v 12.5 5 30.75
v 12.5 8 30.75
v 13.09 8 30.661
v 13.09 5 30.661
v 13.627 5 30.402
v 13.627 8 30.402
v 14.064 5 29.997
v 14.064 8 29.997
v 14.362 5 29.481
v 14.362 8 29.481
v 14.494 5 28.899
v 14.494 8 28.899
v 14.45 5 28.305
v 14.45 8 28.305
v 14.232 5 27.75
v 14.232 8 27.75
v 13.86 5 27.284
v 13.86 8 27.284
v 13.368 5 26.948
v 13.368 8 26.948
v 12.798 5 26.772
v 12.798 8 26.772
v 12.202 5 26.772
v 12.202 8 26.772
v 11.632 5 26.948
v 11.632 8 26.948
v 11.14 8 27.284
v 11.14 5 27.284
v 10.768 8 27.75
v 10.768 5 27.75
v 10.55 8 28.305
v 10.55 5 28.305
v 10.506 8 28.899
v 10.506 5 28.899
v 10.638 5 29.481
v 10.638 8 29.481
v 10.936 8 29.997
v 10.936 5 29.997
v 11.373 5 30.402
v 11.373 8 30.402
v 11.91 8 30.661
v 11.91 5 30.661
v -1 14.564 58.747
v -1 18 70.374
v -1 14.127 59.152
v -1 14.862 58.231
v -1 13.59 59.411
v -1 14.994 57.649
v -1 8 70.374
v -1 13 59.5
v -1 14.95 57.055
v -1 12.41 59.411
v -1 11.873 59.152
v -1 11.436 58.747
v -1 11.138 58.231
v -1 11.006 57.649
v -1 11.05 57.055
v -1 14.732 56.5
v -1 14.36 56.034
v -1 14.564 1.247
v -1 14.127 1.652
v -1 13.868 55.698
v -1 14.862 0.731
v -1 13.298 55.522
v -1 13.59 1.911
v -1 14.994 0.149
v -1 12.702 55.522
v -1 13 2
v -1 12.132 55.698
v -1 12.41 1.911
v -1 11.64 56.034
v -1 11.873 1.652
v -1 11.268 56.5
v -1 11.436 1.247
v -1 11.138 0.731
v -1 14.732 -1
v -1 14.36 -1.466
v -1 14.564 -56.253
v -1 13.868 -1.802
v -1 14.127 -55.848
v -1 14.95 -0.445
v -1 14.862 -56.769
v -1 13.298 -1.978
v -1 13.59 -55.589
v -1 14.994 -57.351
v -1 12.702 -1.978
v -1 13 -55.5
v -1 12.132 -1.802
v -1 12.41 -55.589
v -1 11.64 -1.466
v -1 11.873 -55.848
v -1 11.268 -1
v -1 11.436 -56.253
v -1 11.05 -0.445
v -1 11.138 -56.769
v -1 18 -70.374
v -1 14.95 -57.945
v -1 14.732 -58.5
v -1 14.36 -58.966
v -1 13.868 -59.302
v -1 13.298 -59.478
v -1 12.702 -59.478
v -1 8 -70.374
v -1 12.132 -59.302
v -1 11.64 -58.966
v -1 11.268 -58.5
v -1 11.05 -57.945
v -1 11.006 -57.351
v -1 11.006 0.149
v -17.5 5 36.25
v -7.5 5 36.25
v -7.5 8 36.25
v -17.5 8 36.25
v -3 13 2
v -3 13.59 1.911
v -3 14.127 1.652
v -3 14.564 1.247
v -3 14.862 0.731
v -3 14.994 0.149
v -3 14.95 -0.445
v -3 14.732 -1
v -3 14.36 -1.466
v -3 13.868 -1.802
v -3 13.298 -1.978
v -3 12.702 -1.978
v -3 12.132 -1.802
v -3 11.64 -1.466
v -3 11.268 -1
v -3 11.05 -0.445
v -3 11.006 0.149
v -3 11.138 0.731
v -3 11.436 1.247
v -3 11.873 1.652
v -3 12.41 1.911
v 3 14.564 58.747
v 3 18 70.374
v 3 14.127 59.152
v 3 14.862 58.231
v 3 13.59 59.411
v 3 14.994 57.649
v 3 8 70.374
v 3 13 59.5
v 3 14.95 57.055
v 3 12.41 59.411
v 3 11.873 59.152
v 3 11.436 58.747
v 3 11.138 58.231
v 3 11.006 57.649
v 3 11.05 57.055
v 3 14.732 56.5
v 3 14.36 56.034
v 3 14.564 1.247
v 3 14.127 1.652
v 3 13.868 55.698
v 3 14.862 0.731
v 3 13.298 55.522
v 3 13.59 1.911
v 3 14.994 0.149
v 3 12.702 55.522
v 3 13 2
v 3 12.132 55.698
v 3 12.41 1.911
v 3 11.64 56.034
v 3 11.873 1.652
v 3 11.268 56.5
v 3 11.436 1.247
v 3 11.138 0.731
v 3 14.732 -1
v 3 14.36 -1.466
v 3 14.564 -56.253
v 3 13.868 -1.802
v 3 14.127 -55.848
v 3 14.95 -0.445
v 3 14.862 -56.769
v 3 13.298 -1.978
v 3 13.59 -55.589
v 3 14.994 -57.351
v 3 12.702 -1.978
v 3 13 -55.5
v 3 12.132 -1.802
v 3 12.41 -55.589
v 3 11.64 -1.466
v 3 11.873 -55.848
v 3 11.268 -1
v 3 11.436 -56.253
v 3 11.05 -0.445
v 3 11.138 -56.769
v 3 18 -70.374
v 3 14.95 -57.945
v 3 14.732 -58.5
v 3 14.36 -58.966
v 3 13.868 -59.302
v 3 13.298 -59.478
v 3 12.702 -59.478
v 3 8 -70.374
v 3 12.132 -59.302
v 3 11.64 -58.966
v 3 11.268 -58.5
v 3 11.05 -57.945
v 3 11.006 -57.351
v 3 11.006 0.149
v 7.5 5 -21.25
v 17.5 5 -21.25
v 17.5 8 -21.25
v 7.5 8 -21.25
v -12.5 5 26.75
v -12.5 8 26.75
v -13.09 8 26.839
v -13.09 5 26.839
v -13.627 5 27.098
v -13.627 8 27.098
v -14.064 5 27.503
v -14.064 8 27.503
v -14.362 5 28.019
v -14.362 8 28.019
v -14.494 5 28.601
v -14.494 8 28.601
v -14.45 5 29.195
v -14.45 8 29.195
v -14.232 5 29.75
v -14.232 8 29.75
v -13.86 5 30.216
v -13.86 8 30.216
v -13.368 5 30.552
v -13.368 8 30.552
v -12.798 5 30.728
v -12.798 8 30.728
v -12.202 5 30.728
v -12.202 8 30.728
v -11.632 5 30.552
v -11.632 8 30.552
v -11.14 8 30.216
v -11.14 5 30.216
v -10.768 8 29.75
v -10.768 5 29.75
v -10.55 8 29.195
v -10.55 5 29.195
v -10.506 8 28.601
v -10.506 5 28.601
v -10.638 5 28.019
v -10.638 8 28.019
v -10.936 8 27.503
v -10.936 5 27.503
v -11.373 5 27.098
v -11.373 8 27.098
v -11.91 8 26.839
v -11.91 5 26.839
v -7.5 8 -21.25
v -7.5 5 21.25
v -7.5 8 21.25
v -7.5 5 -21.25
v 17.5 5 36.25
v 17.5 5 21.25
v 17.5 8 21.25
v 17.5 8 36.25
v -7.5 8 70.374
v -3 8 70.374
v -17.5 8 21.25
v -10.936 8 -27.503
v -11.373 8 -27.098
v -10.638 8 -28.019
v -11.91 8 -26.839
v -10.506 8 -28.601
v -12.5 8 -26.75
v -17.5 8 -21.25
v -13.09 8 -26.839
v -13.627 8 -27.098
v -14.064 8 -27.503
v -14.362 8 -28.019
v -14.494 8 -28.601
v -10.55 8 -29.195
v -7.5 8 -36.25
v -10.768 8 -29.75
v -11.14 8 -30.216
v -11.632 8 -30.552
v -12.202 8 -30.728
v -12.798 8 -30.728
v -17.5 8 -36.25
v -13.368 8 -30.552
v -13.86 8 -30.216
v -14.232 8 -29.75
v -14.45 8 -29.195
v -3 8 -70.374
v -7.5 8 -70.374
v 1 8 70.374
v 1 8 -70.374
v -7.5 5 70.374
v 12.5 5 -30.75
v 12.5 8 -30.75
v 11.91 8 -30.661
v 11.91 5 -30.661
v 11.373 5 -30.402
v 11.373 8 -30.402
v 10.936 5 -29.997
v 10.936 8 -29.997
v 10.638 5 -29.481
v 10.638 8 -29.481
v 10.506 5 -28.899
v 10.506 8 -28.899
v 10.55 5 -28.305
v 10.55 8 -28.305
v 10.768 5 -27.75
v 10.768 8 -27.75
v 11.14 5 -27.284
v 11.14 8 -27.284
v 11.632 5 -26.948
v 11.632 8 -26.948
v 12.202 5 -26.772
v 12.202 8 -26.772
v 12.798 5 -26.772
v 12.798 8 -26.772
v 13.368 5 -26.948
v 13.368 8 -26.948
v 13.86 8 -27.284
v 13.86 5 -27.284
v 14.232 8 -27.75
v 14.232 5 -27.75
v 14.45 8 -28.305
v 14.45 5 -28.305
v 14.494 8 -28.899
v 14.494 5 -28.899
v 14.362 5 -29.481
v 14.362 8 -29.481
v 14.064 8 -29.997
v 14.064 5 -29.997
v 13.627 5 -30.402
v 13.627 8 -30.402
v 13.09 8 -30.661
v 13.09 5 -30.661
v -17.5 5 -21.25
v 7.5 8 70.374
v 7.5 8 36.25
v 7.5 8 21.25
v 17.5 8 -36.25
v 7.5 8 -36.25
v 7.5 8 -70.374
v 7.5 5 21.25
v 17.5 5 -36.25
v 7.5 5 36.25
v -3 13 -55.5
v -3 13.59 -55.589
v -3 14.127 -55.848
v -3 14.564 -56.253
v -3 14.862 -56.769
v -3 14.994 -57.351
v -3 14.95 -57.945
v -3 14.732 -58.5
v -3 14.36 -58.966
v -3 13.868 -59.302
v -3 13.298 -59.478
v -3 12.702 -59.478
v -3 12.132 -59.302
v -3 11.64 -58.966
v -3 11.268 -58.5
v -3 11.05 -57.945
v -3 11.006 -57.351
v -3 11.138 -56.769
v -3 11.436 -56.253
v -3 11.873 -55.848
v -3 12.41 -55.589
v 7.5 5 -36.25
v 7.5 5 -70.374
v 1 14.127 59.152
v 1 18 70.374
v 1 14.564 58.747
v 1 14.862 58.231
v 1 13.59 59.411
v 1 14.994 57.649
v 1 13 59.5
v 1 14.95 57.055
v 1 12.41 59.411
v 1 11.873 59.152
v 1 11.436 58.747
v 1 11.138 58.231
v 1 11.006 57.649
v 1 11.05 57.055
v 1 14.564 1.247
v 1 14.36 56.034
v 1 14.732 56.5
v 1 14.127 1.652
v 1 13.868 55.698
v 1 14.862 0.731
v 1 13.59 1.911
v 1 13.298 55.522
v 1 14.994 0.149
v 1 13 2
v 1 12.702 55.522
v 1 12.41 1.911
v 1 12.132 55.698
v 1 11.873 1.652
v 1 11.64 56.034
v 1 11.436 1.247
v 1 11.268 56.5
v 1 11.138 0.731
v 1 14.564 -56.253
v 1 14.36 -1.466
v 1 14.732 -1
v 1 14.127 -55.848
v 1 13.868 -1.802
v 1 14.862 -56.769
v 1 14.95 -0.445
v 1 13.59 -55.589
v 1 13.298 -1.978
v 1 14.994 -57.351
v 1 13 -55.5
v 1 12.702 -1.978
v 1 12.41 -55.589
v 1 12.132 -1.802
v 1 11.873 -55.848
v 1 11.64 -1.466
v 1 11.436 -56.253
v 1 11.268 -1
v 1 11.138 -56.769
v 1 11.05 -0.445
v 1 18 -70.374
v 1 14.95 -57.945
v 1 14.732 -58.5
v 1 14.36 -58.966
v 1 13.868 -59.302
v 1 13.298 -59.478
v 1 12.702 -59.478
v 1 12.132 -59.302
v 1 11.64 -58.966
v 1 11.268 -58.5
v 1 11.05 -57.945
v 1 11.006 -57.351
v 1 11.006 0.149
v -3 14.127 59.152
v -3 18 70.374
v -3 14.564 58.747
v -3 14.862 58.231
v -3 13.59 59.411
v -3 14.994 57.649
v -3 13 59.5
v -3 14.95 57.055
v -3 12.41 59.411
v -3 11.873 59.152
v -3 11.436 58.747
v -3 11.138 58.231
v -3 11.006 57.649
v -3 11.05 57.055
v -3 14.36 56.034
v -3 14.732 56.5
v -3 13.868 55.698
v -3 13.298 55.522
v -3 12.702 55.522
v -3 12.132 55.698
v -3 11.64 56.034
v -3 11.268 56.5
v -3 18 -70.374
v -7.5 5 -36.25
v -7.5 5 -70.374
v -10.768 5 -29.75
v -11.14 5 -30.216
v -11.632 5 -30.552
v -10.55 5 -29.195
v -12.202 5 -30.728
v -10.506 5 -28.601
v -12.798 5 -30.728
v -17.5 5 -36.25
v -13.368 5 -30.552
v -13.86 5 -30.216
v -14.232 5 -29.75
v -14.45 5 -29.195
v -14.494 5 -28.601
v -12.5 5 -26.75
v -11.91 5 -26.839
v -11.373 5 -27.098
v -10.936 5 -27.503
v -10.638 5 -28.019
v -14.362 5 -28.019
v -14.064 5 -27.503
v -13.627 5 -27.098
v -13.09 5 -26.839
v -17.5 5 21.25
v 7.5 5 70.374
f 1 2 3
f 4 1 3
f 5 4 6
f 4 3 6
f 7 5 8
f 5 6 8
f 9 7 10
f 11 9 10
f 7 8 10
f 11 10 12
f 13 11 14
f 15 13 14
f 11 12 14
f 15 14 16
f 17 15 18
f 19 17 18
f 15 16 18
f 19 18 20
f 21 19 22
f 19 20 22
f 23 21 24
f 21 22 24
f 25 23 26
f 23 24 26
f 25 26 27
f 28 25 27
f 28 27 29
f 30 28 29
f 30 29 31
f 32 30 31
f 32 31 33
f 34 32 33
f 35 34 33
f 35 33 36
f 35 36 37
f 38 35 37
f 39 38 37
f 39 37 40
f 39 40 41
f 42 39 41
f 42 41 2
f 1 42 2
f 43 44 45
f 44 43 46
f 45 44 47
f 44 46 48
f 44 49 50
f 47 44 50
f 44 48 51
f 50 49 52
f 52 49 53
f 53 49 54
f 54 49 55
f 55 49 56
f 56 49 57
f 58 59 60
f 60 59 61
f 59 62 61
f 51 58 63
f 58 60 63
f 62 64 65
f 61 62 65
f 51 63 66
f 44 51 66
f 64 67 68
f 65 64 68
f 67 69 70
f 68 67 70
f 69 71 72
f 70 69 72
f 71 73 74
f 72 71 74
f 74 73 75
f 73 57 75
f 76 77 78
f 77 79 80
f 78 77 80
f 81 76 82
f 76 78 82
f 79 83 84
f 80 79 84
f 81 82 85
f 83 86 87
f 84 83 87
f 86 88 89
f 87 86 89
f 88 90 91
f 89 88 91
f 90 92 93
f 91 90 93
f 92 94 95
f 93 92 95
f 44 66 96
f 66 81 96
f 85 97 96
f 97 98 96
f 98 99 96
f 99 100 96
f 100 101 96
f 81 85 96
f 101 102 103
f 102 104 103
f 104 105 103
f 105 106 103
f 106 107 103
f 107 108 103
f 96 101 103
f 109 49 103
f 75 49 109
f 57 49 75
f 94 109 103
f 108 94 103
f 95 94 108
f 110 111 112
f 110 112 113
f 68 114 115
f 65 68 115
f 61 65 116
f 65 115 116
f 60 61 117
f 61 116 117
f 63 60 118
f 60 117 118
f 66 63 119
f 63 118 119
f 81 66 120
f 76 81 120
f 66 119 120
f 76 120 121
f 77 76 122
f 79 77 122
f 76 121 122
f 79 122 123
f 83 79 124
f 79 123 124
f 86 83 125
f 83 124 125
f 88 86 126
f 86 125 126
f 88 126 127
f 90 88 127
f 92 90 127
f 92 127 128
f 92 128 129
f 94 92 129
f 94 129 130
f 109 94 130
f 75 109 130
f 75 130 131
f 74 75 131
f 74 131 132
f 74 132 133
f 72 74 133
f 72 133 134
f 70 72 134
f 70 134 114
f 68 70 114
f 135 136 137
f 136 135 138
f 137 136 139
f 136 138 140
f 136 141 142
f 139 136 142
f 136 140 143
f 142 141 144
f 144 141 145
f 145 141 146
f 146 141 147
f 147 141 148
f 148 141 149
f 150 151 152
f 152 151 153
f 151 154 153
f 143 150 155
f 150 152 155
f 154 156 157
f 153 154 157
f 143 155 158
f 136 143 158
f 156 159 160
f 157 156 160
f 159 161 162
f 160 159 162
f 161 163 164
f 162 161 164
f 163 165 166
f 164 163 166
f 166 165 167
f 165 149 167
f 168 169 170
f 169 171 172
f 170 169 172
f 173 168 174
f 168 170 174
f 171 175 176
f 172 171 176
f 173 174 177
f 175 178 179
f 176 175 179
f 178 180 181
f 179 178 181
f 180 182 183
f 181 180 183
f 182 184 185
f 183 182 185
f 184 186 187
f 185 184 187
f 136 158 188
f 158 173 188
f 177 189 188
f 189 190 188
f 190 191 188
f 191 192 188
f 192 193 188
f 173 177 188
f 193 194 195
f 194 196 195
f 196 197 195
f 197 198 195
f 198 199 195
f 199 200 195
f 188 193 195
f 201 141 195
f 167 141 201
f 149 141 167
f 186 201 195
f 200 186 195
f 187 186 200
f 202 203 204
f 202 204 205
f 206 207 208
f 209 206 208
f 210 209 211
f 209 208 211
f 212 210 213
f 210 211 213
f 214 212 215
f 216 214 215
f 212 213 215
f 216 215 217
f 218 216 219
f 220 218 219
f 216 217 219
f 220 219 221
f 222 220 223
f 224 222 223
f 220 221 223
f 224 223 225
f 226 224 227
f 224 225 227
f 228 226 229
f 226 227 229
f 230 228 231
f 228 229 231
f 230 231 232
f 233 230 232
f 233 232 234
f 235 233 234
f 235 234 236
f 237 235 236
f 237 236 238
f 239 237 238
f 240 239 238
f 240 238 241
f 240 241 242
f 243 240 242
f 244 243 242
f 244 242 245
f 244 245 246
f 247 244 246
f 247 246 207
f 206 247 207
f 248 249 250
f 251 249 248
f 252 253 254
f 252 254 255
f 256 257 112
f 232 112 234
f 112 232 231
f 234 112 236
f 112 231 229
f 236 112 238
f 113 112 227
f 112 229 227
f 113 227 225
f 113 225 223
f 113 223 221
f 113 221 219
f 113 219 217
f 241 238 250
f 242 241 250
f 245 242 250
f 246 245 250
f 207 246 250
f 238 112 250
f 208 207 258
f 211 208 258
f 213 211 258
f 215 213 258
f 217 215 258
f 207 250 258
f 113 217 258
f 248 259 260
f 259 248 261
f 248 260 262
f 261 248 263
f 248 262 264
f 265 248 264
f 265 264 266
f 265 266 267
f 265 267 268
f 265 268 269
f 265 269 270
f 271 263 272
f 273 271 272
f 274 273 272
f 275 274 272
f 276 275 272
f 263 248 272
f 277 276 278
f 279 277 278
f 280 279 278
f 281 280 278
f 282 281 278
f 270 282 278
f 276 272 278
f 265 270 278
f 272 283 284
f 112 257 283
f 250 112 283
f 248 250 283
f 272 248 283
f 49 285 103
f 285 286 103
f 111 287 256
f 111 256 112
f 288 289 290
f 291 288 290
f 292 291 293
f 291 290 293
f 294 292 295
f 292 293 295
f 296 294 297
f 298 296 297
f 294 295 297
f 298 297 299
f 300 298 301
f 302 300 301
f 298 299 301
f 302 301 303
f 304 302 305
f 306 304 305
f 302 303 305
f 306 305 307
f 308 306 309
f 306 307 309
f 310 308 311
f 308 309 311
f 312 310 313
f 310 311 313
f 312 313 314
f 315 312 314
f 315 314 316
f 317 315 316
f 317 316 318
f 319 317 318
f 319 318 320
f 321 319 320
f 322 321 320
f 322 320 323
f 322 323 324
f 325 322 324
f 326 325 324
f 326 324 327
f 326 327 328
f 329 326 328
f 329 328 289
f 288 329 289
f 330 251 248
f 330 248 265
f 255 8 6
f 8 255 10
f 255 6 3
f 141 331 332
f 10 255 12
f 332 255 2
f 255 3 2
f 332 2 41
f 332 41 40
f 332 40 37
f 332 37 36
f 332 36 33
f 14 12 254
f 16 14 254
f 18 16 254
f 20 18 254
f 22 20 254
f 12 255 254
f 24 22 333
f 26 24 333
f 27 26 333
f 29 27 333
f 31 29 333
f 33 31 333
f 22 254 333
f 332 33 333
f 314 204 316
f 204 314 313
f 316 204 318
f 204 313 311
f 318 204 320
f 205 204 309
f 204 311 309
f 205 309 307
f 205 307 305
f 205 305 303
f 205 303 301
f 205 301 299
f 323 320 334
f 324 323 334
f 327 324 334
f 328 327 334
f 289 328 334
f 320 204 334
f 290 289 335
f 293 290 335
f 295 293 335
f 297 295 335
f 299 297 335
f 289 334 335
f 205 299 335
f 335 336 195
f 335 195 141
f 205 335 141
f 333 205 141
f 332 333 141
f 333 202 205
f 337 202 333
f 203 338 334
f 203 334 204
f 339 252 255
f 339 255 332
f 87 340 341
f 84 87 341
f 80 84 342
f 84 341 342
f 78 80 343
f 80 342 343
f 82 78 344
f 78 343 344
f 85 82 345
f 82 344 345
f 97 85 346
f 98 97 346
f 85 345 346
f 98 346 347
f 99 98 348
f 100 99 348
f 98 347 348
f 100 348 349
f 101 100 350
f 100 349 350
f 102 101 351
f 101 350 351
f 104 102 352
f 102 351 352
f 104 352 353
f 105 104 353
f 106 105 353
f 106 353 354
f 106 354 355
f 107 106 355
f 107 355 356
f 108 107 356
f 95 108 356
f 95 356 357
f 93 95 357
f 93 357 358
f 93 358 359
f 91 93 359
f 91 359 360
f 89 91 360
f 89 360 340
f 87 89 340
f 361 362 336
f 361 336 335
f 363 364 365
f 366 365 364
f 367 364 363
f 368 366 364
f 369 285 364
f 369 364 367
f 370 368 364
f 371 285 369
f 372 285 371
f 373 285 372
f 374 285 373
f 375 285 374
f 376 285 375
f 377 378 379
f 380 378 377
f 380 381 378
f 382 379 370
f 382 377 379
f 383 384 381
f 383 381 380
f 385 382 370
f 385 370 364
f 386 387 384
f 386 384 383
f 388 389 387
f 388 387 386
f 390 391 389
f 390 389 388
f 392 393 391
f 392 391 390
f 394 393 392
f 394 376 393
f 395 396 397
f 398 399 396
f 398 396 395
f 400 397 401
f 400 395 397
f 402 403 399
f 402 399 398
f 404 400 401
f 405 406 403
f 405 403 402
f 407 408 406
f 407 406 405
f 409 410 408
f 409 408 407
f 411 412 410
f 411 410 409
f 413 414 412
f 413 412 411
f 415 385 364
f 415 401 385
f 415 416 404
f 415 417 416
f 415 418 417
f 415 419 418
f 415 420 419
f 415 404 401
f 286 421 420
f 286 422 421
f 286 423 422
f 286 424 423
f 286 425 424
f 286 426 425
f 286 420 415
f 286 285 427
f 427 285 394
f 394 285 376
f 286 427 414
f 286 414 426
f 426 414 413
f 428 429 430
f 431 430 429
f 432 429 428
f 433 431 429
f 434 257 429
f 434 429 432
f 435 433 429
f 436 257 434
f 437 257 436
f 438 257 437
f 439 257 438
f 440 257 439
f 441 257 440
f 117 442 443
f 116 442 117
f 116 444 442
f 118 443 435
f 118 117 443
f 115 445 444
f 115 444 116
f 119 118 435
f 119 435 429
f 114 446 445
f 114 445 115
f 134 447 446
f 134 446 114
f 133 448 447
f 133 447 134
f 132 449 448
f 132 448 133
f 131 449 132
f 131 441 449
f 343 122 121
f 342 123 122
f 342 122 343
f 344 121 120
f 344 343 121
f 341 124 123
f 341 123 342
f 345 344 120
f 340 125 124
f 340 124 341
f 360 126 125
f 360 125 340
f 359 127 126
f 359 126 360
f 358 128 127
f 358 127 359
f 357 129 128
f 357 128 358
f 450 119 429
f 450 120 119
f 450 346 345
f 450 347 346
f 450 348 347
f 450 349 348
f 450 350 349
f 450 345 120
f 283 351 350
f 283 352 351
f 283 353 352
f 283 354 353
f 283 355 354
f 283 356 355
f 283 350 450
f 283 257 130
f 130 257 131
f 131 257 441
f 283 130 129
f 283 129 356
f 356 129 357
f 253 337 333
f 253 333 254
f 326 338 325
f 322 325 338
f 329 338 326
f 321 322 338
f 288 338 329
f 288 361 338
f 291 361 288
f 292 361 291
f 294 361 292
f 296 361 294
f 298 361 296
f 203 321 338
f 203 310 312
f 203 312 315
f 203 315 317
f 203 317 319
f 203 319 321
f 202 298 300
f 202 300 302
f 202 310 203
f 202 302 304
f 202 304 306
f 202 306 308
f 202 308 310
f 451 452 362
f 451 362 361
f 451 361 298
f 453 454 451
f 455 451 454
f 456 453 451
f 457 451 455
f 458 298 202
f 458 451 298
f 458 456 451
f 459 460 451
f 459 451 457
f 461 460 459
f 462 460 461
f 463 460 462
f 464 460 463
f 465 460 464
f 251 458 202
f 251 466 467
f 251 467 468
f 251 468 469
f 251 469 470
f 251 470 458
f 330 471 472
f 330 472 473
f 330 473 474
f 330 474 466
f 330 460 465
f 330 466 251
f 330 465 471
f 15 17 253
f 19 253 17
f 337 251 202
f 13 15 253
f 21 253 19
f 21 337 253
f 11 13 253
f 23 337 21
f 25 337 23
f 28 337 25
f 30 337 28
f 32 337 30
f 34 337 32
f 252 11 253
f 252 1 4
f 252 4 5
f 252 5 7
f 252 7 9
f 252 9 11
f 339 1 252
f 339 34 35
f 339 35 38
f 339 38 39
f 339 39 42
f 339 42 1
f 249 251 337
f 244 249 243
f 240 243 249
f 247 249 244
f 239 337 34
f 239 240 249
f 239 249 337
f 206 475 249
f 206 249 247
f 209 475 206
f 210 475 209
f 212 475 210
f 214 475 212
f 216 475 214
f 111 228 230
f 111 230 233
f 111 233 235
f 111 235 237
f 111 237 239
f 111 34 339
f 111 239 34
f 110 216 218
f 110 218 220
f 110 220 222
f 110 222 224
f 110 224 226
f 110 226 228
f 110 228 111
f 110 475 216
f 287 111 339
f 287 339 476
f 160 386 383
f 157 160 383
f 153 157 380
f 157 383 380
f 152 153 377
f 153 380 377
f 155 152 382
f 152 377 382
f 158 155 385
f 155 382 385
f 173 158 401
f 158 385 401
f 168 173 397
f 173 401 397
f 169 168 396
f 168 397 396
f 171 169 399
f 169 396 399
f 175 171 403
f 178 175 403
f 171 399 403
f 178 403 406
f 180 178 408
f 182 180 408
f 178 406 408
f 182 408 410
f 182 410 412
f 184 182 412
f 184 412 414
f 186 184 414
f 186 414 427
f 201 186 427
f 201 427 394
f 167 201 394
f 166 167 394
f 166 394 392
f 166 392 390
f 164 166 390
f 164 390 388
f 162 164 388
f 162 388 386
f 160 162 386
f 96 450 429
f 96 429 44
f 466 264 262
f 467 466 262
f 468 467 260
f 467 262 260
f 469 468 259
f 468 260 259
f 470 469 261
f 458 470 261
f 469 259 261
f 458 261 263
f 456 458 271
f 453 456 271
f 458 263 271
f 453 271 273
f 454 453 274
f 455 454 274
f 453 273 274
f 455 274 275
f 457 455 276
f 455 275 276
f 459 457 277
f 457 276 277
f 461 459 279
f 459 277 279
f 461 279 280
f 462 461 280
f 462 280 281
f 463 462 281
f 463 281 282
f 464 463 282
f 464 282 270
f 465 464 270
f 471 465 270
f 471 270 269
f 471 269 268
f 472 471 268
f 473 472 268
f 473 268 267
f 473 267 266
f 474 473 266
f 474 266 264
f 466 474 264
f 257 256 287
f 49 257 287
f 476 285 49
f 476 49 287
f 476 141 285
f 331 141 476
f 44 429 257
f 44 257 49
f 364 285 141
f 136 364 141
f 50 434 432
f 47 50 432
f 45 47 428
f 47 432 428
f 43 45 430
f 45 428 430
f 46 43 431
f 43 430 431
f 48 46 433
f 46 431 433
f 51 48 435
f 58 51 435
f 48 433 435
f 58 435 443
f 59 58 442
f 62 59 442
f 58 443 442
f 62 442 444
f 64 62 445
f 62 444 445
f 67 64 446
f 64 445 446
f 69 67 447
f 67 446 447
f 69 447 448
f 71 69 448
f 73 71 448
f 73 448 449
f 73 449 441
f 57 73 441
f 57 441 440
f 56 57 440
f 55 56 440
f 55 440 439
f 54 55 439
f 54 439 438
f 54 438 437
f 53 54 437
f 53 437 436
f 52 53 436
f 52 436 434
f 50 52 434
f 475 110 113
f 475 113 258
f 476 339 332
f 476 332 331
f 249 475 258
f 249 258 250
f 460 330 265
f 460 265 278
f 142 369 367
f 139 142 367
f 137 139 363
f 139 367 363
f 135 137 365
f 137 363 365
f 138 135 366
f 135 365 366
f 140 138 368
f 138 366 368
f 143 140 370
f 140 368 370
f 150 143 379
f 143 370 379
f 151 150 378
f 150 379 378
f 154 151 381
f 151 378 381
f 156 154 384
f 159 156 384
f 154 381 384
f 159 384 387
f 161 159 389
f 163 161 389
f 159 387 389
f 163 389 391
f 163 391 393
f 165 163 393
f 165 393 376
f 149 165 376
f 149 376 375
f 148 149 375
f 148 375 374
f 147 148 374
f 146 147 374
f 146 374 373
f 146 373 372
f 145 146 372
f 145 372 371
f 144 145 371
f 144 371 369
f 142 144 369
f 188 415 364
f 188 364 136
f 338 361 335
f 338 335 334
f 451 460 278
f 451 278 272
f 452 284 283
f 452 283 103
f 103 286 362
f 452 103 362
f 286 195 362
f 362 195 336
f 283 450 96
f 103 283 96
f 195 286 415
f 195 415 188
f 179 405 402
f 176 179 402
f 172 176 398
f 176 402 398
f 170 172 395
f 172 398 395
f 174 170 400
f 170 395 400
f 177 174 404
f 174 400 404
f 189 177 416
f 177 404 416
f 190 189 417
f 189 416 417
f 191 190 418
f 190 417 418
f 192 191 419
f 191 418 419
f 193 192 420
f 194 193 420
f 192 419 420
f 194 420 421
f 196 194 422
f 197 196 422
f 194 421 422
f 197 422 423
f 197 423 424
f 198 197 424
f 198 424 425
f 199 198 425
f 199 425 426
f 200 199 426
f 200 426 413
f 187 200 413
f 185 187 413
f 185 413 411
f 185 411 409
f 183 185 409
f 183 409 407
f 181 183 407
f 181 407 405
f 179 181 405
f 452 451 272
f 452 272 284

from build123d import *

# Parameters (mm, degrees)
BOSS_EXTRUDE1_DEPTH = 5
BOSS_EXTRUDE2_DEPTH = 3
SKETCH3_W           = 2
SKETCH3_H           = 170
BOSS_EXTRUDE3_DEPTH = 10
SKETCH5_R           = 2
CUT_EXTRUDE1_DEPTH  = 10
SKETCH6_R           = 2
CUT_EXTRUDE3_DEPTH  = 5
SKETCH8_W           = 55
SKETCH8_H           = 14.626241735
CUT_EXTRUDE4_DEPTH  = 20
SKETCH9_W           = 140.74751653
SKETCH9_H           = 5
CUT_EXTRUDE5_DEPTH  = 300


with BuildPart() as part:
    # Sketch1 → Boss-Extrude1 (new body)
    with BuildSketch(Plane(origin=(0, 0, 0), x_dir=(1, 0, 0), z_dir=(0, 1, 0))):
        with BuildLine():
            Line((-27.5, 42.873758265), (-27.5, 13.75))
            ThreePointArc((-27.5, 13.75), (-13.75, 0), (-27.5, -13.75))
            Line((-27.5, -13.75), (-27.5, -42.873758265))
            ThreePointArc((-27.5, -42.873758265), (-13.75, -56.623758265), (-27.5, -70.373758265))
            Line((-27.5, -70.373758265), (-27.5, -85))
            Line((-27.5, -85), (27.5, -85))
            Line((27.5, -85), (27.5, -70.373758265))
            ThreePointArc((27.5, -70.373758265), (13.75, -56.623758265), (27.5, -42.873758265))
            Line((27.5, -42.873758265), (27.5, -13.75))
            ThreePointArc((27.5, -13.75), (13.75, 0), (27.5, 13.75))
            Line((27.5, 13.75), (27.5, 42.873758265))
            ThreePointArc((27.5, 42.873758265), (13.75, 56.623758265), (27.5, 70.373758265))
            Line((27.5, 70.373758265), (27.5, 85))
            Line((27.5, 85), (-27.5, 85))
            Line((-27.5, 85), (-27.5, 70.373758265))
            ThreePointArc((-27.5, 70.373758265), (-13.75, 56.623758265), (-27.5, 42.873758265))
        make_face()
    extrude(amount=BOSS_EXTRUDE1_DEPTH)

    # Sketch2 → Boss-Extrude2 (add)
    with BuildSketch(Plane(origin=(0, 5, 0), x_dir=(1, 0, 0), z_dir=(0, 1, 0))):
        Polygon((-7.5, 85), (7.5, 85), (7.5, 36.25), (17.5, 36.25), (17.5, 21.25), (7.5, 21.25), (7.5, -21.25), (17.5, -21.25), (17.5, -36.25), (7.5, -36.25), (7.5, -85), (-7.5, -85), (-7.5, -36.25), (-17.5, -36.25), (-17.5, -21.25), (-7.5, -21.25), (-7.5, 21.25), (-17.5, 21.25), (-17.5, 36.25), (-7.5, 36.25), align=None)
    extrude(amount=BOSS_EXTRUDE2_DEPTH)

    # Sketch3 → Boss-Extrude3 (add)
    with BuildSketch(Plane(origin=(0, 8, 0), x_dir=(1, 0, 0), z_dir=(0, 1, 0))):
        with Locations((-2, 0)):
            Rectangle(SKETCH3_W, SKETCH3_H)
        with Locations((2, 0)):
            Rectangle(SKETCH3_W, SKETCH3_H)
    extrude(amount=BOSS_EXTRUDE3_DEPTH)

    # Sketch5 → Cut-Extrude1 (cut)
    with BuildSketch(Plane.ZY.offset(3)):
        with Locations((0, 13)):
            Circle(SKETCH5_R)
        with Locations((-57.5, 13)):
            Circle(SKETCH5_R)
        with Locations((57.5, 13)):
            Circle(SKETCH5_R)
    extrude(amount=-CUT_EXTRUDE1_DEPTH, mode=Mode.SUBTRACT)

    # Sketch6 → Cut-Extrude3 (cut)
    with BuildSketch(Plane(origin=(0, 8, 0), x_dir=(1, 0, 0), z_dir=(0, 1, 0))):
        with Locations(Location((-12.5, 28.75, 0), (0, 0, 270))):
            Circle(SKETCH6_R)
        with Locations(Location((12.5, 28.75, 0), (0, 0, 90))):
            Circle(SKETCH6_R)
        with Locations(Location((12.5, -28.75, 0), (0, 0, 270))):
            Circle(SKETCH6_R)
        with Locations(Location((-12.5, -28.75, 0), (0, 0, 90))):
            Circle(SKETCH6_R)
    extrude(amount=-CUT_EXTRUDE3_DEPTH, mode=Mode.SUBTRACT)

    # Sketch8 → Cut-Extrude4 (cut)
    with BuildSketch(Plane(origin=(0, 18, 0), x_dir=(1, 0, 0), z_dir=(0, 1, 0))):
        with Locations((0, 77.686879132)):
            Rectangle(SKETCH8_W, SKETCH8_H)
        with Locations((0, -77.686879132)):
            Rectangle(SKETCH8_W, SKETCH8_H)
    extrude(amount=-CUT_EXTRUDE4_DEPTH, mode=Mode.SUBTRACT)

    # Sketch9 → Cut-Extrude5 (cut)
    with BuildSketch(Plane.ZY.offset(27.5)):
        with Locations((0, 2.5)):
            Rectangle(SKETCH9_W, SKETCH9_H)
    extrude(amount=-CUT_EXTRUDE5_DEPTH, mode=Mode.SUBTRACT)


solid = part.part
